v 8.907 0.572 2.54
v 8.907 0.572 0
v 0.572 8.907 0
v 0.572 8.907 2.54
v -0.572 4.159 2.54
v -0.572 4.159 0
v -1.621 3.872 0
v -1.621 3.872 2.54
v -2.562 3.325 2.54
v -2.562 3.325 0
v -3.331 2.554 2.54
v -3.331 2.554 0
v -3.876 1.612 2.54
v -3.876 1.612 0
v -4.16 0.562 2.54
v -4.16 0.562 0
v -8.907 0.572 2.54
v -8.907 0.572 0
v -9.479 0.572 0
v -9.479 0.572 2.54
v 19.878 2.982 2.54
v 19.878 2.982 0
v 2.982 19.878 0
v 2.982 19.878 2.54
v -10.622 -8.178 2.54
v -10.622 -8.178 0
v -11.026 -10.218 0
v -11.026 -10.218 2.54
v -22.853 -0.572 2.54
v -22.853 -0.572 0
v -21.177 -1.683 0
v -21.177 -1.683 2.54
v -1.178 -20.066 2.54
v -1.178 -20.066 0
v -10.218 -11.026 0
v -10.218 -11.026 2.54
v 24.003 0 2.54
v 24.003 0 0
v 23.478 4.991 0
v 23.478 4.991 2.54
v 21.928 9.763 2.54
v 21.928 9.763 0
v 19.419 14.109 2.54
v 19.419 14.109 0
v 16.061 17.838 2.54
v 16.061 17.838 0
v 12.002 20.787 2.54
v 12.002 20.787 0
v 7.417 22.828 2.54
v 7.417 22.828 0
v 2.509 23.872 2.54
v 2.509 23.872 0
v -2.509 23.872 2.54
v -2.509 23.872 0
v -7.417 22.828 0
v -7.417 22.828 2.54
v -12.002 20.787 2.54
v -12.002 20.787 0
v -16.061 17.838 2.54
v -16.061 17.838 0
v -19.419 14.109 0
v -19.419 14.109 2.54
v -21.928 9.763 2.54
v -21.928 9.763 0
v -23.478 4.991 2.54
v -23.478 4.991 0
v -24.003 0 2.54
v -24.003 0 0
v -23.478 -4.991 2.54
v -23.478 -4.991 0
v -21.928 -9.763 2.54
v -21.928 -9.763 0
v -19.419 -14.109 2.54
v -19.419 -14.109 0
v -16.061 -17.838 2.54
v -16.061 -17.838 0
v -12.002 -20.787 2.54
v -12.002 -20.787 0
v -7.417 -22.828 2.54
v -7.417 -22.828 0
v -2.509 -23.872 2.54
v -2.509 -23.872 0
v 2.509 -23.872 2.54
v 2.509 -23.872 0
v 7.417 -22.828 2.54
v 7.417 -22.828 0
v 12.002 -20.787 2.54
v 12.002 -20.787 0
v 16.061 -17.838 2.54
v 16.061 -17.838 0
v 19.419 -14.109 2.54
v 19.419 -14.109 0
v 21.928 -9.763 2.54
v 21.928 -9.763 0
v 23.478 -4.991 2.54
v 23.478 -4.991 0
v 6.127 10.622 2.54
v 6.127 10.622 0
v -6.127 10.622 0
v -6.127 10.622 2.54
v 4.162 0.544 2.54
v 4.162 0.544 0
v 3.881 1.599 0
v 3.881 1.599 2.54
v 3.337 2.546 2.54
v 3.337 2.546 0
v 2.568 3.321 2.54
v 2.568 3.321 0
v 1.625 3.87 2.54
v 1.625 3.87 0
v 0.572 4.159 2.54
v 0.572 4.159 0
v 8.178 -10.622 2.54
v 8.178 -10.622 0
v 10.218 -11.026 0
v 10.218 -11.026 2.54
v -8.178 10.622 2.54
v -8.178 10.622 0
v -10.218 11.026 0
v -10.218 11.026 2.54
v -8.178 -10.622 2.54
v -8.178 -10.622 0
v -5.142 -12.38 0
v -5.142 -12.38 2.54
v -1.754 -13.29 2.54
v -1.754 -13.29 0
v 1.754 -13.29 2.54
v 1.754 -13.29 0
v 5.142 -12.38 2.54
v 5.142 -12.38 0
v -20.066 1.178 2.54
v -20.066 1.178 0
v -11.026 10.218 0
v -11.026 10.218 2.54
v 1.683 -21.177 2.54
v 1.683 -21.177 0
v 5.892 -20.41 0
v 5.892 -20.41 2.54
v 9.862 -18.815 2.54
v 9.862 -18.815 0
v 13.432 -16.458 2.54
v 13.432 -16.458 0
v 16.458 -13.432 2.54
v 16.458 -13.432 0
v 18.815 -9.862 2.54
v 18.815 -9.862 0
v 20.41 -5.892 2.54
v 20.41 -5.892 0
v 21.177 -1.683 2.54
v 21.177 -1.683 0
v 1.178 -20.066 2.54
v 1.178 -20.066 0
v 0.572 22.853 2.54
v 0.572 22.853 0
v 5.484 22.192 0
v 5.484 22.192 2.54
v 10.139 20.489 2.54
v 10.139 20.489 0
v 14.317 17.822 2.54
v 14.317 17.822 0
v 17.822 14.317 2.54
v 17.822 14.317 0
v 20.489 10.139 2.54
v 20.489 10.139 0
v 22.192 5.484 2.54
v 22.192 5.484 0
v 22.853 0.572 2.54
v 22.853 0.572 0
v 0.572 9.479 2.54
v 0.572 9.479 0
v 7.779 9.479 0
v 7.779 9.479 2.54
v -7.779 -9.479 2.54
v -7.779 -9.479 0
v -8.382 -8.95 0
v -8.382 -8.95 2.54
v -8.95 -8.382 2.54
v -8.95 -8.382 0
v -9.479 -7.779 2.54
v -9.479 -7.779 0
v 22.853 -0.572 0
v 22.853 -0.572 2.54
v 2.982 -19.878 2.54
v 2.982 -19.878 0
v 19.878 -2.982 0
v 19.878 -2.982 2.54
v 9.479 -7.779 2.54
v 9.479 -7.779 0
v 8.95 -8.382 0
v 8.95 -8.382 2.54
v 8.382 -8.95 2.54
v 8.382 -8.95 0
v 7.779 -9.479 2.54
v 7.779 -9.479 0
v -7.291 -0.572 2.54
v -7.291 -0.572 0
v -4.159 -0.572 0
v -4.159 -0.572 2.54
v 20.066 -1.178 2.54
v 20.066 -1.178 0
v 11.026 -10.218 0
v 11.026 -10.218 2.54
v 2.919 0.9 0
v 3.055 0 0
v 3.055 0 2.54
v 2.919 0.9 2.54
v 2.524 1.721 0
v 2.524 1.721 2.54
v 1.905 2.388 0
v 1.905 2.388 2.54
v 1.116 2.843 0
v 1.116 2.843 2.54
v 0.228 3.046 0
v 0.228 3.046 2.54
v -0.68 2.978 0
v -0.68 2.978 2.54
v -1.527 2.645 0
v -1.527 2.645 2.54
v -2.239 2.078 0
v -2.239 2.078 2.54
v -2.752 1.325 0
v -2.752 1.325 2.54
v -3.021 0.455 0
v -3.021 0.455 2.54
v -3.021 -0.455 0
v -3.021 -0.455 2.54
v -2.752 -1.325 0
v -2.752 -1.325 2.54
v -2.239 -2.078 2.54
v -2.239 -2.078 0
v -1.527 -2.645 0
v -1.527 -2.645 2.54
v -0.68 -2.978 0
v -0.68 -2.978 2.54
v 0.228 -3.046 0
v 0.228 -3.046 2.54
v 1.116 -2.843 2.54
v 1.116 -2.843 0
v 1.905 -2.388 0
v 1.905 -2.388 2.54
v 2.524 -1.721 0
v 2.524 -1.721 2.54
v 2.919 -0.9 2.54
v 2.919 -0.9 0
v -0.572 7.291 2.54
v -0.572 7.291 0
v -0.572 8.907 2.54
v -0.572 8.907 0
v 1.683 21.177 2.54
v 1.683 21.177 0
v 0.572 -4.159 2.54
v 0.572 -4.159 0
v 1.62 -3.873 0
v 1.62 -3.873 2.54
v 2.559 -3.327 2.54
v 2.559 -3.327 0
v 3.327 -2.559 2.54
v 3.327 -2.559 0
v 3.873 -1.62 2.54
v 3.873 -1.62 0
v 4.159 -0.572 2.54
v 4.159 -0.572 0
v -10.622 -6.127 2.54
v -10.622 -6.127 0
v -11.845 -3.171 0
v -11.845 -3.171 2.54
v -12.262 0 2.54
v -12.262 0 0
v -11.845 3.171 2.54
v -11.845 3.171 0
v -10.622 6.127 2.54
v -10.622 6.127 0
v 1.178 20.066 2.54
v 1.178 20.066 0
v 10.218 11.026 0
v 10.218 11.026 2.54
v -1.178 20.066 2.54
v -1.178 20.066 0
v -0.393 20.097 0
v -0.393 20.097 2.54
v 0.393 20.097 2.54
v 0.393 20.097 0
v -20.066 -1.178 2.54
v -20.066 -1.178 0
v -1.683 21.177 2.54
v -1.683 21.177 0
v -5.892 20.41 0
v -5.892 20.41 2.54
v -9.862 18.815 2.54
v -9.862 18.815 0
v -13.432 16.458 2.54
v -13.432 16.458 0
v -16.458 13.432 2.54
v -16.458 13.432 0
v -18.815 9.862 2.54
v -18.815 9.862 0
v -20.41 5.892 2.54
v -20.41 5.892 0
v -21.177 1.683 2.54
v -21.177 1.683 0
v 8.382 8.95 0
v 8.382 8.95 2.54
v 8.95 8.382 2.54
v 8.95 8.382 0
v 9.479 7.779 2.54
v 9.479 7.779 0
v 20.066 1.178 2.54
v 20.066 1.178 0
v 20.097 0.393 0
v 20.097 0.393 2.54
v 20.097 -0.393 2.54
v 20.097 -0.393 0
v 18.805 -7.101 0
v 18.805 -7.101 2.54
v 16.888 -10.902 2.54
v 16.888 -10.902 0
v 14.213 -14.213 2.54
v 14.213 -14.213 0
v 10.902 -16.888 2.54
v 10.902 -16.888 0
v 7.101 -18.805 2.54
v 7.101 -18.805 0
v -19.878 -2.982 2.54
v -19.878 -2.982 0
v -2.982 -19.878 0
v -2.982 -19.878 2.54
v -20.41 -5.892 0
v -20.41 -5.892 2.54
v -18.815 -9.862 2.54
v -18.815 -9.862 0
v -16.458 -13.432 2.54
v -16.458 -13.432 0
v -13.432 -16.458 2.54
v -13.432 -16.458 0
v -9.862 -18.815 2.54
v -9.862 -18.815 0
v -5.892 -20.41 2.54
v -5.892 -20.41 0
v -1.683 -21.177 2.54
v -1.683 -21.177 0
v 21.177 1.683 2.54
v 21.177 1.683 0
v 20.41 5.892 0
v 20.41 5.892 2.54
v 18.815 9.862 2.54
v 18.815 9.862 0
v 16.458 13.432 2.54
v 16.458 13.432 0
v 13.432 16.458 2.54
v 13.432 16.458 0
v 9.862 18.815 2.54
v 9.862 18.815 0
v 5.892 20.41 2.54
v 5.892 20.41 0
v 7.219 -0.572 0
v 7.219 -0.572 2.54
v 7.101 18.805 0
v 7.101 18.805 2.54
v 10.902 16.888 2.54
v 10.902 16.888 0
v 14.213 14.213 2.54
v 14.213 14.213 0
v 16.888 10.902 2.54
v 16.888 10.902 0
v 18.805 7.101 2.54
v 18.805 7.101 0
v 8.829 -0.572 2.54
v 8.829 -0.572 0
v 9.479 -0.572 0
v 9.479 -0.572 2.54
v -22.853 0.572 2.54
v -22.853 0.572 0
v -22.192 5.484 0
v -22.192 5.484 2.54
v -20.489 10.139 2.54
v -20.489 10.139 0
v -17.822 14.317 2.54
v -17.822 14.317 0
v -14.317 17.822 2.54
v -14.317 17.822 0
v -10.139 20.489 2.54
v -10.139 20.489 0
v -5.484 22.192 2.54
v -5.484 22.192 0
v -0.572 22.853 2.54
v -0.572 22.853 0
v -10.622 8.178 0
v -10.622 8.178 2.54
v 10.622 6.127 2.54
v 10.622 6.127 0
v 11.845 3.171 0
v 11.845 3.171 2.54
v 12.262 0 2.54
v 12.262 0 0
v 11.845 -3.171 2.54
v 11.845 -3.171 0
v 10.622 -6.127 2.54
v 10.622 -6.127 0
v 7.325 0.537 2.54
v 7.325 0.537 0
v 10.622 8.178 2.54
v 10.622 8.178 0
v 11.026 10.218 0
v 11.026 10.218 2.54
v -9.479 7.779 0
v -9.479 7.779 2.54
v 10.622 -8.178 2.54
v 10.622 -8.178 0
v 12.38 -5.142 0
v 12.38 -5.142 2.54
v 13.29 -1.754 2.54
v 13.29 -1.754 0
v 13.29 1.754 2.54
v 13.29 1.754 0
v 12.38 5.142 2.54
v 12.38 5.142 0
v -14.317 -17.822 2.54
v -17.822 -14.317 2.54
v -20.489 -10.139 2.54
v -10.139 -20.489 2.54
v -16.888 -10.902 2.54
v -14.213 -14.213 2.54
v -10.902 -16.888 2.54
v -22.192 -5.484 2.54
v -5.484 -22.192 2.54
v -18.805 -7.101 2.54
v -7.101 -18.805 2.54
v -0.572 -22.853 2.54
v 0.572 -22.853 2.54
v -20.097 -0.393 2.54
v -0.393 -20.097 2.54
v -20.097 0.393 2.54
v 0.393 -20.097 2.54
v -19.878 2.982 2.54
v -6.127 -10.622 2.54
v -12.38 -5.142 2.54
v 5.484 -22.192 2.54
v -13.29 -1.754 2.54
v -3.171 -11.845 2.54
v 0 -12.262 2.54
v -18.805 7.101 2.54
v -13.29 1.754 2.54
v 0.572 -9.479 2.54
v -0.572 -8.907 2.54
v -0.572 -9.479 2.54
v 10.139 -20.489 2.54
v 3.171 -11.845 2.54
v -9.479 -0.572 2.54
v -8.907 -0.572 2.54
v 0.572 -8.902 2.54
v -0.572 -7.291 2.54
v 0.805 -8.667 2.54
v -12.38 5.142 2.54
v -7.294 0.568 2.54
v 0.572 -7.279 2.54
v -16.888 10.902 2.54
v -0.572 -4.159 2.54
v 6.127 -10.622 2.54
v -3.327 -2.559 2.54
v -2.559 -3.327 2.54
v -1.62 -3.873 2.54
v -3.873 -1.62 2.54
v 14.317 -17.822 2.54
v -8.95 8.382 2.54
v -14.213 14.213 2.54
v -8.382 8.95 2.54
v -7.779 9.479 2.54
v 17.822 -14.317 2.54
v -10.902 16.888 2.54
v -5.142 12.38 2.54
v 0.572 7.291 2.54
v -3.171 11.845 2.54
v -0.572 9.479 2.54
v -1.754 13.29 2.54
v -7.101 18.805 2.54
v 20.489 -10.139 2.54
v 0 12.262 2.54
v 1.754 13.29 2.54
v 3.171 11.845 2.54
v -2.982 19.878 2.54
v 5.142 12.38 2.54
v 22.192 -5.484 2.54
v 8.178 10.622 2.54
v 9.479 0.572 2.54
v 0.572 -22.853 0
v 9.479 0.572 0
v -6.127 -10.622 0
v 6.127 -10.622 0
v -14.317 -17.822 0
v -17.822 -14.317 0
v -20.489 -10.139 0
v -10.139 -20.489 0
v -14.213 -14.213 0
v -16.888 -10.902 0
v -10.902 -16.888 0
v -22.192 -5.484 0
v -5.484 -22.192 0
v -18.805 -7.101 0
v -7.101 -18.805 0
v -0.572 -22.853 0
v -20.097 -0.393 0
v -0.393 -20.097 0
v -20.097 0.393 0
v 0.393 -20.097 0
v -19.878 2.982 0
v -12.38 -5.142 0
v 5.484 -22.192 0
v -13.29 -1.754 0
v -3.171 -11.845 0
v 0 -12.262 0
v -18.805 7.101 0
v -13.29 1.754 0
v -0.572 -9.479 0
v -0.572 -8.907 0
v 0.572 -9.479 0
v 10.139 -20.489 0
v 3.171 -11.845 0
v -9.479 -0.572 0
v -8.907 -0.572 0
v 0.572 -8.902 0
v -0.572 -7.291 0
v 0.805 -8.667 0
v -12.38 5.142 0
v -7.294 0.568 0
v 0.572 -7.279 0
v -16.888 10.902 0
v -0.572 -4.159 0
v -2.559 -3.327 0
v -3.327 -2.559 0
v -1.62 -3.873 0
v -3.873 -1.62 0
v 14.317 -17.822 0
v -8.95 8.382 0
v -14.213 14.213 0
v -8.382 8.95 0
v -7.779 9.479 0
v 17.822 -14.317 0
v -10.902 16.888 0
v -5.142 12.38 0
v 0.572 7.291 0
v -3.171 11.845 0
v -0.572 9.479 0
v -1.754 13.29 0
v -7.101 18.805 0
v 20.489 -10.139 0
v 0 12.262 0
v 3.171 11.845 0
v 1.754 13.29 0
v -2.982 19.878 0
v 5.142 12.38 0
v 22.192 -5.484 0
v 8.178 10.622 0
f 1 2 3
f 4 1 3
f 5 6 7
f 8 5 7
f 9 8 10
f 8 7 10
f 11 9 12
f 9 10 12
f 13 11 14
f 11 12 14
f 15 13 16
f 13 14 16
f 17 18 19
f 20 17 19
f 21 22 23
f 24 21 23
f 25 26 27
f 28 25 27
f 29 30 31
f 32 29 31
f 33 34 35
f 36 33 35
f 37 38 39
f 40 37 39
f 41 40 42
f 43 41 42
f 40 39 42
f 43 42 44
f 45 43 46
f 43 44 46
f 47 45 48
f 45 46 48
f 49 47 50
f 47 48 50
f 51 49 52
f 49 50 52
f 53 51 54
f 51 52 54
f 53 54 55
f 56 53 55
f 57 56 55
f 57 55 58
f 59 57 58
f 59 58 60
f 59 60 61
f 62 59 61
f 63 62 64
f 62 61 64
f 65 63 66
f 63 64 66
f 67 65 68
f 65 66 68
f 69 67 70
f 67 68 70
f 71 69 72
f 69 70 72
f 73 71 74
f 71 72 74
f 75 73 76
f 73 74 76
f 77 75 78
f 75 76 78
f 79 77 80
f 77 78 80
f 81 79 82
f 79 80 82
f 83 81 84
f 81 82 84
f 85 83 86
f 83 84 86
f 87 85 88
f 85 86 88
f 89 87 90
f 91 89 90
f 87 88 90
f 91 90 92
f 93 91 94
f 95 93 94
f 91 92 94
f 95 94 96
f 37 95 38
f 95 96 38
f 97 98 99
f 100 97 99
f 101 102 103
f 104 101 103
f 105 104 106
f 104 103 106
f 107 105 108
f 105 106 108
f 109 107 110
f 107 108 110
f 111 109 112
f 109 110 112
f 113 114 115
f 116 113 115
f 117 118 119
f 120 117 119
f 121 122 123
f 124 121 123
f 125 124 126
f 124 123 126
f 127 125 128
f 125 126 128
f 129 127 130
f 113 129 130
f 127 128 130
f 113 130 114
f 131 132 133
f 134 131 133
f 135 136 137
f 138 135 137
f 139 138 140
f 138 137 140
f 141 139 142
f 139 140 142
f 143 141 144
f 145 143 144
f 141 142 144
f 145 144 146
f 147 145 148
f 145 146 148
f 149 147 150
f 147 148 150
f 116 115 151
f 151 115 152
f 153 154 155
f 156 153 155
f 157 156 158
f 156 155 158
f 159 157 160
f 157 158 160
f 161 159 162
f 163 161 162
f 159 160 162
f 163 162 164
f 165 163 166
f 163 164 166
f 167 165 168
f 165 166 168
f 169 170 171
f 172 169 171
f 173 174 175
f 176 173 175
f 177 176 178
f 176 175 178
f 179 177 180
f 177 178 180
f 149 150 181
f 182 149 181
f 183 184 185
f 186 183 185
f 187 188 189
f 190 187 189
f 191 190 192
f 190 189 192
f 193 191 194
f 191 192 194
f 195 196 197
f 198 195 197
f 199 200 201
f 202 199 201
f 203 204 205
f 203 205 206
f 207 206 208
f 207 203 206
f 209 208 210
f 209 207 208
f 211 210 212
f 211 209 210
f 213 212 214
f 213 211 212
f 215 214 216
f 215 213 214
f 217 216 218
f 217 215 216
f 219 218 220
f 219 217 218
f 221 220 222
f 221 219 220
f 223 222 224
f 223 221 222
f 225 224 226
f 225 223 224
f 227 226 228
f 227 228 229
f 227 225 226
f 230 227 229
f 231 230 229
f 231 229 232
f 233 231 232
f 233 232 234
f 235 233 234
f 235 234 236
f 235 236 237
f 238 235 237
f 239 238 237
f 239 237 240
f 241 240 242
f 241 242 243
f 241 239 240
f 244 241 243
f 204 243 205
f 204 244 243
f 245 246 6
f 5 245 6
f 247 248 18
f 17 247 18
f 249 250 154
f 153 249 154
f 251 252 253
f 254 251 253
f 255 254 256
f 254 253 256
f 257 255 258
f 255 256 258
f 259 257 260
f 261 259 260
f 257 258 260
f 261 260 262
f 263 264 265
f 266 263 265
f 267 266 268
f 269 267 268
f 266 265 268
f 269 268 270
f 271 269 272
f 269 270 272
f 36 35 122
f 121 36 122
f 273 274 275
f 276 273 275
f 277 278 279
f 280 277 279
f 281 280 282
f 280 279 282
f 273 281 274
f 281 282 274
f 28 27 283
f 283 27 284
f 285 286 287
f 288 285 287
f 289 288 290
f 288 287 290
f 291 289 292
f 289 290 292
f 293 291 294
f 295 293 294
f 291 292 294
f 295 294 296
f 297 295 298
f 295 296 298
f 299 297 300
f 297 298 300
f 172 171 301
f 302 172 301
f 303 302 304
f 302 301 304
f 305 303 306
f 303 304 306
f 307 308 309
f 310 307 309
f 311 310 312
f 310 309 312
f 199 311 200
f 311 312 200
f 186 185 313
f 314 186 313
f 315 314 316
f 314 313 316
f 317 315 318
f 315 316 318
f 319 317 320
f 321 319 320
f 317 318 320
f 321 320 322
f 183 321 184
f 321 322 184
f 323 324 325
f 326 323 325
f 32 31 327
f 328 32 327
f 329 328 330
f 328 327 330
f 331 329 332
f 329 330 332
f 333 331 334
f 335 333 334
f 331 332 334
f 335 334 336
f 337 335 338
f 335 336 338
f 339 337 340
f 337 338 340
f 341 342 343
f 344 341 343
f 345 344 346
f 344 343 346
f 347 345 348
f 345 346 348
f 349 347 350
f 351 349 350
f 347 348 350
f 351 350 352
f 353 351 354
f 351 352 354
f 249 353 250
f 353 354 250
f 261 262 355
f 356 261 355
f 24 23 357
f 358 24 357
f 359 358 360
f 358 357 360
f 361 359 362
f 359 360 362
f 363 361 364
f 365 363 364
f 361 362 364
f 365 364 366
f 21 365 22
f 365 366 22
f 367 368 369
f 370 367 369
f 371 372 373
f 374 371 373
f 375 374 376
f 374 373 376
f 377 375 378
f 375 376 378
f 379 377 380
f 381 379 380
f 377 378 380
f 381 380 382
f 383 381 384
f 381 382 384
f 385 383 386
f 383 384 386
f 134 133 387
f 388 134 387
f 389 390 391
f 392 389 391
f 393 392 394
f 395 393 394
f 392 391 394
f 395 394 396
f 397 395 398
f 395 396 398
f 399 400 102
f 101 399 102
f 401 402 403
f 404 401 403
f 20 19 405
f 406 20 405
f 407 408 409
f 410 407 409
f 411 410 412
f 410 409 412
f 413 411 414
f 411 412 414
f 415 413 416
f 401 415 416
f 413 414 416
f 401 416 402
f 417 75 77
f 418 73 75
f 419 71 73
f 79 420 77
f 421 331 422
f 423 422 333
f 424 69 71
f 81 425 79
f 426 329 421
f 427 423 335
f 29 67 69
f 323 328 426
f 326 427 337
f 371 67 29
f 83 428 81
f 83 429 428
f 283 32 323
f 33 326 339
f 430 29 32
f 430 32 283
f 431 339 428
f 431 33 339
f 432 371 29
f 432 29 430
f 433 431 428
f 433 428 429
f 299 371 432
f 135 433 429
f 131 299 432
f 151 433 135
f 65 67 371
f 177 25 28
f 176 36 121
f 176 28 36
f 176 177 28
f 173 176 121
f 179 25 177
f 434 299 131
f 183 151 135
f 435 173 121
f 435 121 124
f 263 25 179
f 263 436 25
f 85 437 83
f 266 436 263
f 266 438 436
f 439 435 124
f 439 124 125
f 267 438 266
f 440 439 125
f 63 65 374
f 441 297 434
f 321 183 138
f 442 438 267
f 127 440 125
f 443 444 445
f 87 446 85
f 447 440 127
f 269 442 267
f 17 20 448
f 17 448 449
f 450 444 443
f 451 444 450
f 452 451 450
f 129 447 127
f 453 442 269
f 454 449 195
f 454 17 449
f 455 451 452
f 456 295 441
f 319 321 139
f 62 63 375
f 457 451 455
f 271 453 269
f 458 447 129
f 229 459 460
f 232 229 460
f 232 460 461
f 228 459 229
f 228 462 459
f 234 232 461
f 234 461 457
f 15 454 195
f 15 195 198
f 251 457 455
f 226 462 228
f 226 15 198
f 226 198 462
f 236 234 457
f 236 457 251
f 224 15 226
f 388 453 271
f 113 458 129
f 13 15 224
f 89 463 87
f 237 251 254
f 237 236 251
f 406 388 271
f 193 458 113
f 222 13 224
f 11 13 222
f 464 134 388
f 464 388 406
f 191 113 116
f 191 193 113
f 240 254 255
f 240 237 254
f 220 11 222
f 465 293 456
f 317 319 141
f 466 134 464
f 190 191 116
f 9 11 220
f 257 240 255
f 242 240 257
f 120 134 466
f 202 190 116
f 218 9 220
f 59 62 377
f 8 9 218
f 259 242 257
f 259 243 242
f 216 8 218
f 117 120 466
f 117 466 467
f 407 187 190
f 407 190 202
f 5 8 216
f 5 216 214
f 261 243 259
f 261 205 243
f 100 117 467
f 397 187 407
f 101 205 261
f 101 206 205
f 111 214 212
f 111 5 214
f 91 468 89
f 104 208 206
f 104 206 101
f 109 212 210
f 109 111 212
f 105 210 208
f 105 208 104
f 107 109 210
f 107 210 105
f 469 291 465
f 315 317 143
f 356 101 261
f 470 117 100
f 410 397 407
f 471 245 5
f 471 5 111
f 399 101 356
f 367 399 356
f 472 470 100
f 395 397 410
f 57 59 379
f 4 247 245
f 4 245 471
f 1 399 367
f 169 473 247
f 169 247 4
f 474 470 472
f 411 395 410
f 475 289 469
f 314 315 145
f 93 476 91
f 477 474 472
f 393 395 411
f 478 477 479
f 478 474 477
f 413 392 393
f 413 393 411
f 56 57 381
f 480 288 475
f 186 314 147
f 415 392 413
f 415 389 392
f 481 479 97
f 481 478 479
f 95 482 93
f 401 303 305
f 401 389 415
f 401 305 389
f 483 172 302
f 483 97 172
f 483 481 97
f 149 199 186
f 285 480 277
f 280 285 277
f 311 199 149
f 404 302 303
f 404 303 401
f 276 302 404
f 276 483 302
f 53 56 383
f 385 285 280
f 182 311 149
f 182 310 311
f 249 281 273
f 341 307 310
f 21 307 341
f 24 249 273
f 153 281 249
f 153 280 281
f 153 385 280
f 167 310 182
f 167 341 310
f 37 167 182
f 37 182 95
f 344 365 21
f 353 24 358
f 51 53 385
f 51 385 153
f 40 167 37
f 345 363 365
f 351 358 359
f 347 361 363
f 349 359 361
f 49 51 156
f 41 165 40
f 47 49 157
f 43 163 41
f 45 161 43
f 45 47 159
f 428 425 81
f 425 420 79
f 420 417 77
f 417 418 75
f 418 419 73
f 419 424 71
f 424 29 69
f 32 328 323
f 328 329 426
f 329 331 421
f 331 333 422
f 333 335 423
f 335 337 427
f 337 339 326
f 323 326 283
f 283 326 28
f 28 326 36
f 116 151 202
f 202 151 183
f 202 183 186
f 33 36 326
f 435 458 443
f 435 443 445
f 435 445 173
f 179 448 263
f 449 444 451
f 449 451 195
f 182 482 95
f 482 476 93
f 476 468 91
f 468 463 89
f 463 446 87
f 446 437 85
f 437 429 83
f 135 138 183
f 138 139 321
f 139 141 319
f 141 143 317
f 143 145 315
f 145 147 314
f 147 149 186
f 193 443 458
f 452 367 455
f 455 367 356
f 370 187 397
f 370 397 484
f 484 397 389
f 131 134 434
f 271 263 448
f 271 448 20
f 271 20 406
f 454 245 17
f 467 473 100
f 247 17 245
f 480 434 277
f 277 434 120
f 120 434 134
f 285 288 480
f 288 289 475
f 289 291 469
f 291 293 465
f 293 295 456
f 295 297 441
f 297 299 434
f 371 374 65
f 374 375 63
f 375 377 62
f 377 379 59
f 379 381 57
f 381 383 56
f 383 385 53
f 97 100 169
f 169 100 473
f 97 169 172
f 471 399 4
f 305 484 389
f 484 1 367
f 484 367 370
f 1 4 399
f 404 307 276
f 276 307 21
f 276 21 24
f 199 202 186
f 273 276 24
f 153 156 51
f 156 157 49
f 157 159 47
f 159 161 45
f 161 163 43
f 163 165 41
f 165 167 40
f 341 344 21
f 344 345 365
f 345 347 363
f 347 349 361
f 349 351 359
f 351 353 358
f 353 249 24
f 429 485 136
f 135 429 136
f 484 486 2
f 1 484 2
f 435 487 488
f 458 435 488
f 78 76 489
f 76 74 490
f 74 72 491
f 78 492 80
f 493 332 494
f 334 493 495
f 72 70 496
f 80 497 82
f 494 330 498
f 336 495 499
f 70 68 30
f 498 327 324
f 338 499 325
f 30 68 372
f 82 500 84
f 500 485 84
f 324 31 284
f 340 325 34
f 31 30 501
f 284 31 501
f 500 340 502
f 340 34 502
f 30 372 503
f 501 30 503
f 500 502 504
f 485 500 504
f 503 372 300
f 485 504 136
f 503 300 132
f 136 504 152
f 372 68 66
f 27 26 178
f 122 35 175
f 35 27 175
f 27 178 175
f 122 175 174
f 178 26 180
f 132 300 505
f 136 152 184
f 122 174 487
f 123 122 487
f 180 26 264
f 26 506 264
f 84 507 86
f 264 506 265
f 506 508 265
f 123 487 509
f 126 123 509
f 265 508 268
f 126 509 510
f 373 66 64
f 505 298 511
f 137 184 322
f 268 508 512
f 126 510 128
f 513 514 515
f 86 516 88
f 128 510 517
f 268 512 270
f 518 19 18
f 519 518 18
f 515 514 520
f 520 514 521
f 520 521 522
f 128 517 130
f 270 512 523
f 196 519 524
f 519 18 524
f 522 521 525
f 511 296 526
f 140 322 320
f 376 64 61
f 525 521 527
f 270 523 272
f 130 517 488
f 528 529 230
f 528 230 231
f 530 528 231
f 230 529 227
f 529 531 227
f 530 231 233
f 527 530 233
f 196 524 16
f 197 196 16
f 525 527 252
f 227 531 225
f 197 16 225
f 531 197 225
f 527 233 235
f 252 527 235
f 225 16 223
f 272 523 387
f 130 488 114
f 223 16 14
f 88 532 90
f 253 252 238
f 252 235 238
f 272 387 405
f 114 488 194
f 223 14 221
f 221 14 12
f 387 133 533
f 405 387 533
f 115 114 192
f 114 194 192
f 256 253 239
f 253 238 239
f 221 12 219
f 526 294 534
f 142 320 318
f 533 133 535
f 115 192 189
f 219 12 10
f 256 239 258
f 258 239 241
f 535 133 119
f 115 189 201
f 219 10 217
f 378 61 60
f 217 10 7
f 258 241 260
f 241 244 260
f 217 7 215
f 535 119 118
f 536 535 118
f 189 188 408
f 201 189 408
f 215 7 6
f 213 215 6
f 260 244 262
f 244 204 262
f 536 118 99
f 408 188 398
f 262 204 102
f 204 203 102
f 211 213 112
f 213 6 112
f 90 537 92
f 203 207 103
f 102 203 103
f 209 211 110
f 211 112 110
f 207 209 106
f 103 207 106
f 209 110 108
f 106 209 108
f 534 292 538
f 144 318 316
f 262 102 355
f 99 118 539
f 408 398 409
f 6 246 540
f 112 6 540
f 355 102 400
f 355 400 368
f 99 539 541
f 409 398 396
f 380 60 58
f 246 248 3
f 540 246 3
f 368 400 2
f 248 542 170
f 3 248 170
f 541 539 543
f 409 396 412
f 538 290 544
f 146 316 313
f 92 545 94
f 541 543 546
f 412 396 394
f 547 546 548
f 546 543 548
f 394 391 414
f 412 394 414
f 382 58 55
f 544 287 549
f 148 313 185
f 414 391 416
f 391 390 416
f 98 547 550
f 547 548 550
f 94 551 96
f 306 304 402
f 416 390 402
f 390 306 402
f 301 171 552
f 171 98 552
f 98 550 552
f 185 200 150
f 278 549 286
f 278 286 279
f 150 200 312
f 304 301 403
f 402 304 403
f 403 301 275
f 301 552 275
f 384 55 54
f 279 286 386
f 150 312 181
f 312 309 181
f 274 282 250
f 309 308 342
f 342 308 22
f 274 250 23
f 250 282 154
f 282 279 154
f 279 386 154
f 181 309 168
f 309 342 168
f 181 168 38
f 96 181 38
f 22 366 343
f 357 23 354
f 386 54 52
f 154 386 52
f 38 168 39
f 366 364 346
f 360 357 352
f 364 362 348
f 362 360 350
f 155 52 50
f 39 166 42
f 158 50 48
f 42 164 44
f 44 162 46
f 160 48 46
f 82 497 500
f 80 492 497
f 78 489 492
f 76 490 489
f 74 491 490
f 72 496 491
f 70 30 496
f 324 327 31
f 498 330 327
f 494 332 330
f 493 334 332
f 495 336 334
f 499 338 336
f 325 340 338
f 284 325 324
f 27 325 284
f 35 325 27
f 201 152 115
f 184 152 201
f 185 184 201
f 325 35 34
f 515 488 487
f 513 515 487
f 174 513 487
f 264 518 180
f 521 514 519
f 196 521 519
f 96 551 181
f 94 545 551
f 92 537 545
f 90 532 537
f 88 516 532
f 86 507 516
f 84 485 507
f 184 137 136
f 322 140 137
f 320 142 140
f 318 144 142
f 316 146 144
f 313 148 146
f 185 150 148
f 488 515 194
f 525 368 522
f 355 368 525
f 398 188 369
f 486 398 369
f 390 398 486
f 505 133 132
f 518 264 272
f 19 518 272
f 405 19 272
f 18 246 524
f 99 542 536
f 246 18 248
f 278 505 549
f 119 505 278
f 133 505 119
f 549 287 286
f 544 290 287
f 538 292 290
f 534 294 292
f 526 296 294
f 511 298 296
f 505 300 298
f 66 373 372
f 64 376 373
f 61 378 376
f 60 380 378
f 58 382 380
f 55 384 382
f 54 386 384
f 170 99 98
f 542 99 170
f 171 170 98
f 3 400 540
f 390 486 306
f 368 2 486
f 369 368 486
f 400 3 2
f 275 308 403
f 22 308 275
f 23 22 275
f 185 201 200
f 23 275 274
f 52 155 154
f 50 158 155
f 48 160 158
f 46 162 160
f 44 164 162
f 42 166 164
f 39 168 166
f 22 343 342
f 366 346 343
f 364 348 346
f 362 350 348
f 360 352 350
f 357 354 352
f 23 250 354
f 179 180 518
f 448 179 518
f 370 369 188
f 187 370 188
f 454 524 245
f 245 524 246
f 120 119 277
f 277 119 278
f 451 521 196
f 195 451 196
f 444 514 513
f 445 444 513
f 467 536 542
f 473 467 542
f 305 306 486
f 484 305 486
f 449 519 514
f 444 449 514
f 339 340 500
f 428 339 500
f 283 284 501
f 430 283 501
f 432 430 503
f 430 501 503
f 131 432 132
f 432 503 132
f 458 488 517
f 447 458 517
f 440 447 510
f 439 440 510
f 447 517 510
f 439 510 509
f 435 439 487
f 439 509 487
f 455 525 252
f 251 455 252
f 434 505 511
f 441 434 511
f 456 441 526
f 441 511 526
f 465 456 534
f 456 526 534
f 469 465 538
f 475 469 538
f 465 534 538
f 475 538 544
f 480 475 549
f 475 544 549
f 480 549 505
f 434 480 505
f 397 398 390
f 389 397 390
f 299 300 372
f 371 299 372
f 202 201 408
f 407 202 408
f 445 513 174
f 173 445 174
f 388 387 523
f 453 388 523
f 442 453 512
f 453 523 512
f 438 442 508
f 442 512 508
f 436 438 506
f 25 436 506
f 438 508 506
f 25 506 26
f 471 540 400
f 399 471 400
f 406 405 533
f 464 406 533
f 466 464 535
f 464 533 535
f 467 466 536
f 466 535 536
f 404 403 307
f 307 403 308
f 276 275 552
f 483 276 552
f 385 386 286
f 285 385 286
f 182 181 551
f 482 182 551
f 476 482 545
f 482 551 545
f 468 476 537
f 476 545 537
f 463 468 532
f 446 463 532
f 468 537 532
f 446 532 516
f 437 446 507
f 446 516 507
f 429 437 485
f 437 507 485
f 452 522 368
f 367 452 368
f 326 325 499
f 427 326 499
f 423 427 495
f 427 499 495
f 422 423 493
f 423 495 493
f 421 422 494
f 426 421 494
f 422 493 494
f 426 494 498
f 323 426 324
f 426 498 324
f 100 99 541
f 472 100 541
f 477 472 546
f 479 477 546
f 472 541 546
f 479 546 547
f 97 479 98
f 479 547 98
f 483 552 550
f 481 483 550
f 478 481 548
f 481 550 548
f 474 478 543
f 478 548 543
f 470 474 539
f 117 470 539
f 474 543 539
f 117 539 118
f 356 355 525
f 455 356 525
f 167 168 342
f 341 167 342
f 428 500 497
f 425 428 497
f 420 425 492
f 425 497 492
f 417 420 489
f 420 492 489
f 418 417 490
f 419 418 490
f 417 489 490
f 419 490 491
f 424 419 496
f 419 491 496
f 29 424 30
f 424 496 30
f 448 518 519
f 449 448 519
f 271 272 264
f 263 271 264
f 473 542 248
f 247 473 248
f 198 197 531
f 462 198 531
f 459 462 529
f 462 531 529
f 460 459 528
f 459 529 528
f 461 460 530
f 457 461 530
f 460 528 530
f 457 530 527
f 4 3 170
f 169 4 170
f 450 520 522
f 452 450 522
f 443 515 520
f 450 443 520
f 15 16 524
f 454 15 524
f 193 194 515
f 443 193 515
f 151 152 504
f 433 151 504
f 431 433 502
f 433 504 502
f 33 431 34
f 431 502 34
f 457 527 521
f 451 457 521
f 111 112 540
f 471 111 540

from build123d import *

# Parameters (mm, degrees)
F0_R     = 24.003
F0_R_2   = 3.054646
F1_DEPTH = 2.54


with BuildPart() as f1:
    # F0 (on Top) → F1 (new body)
    with BuildSketch(Plane.XY):
        Circle(F0_R)
        with BuildLine():
            ThreePointArc((1.17752, -20.066034), (0, -20.100554), (-1.17752, -20.066034))
            Line((-1.17752, -20.066034), (-10.217665, -11.025888))
            Line((-10.217665, -11.025888), (-8.177547, -10.621777))
            ThreePointArc((-8.177547, -10.621777), (0, -13.405015), (8.177547, -10.621777))
            Line((8.177547, -10.621777), (10.217665, -11.025888))
            Line((10.217665, -11.025888), (1.17752, -20.066034))
        make_face(mode=Mode.SUBTRACT)
        with BuildLine():
            ThreePointArc((-0.5715, -22.852855), (-16.164461, -16.164461), (-22.852855, -0.5715))
            Line((-22.852855, -0.5715), (-21.176763, -1.683237))
            ThreePointArc((-21.176763, -1.683237), (-15.021461, -15.021461), (-1.683237, -21.176763))
            Line((-1.683237, -21.176763), (-0.5715, -22.852855))
        make_face(mode=Mode.SUBTRACT)
        with BuildLine():
            Line((-19.87815, -2.98185), (-2.98185, -19.87815))
            ThreePointArc((-2.98185, -19.87815), (-14.213238, -14.213238), (-19.87815, -2.98185))
        make_face(mode=Mode.SUBTRACT)
        with BuildLine():
            ThreePointArc((-10.621777, -6.12657), (-12.262015, 0), (-10.621777, 6.12657))
            Line((-10.621777, 6.12657), (-10.621777, -6.12657))
        make_face(mode=Mode.SUBTRACT)
        with BuildLine():
            Line((-0.5715, -9.478777), (-7.778804, -9.478777))
            ThreePointArc((-7.778804, -9.478777), (-8.670554, -8.670554), (-9.478777, -7.778804))
            Line((-9.478777, -7.778804), (-9.478777, -0.5715))
            Line((-9.478777, -0.5715), (-8.907277, -0.5715))
            Line((-8.907277, -0.5715), (-7.645644, -1.833133))
            Line((-7.645644, -1.833133), (-1.833133, -7.645644))
            Line((-1.833133, -7.645644), (-0.808231, -8.670546))
            Line((-0.808231, -8.670546), (-0.5715, -8.907277))
            Line((-0.5715, -8.907277), (-0.5715, -9.478777))
        make_face(mode=Mode.SUBTRACT)
        with BuildLine():
            Line((-0.5715, -7.290831), (-7.290831, -0.5715))
            Line((-7.290831, -0.5715), (-4.15856, -0.5715))
            ThreePointArc((-4.15856, -0.5715), (-2.968184, -2.968184), (-0.5715, -4.15856))
            Line((-0.5715, -4.15856), (-0.5715, -7.290831))
        make_face(mode=Mode.SUBTRACT)
        with BuildLine():
            ThreePointArc((6.12657, -10.621777), (0, -12.262015), (-6.12657, -10.621777))
            Line((-6.12657, -10.621777), (6.12657, -10.621777))
        make_face(mode=Mode.SUBTRACT)
        with BuildLine():
            ThreePointArc((22.852855, -0.5715), (16.164461, -16.164461), (0.5715, -22.852855))
            Line((0.5715, -22.852855), (1.683237, -21.176763))
            ThreePointArc((1.683237, -21.176763), (15.021461, -15.021461), (21.176763, -1.683237))
            Line((21.176763, -1.683237), (22.852855, -0.5715))
        make_face(mode=Mode.SUBTRACT)
        with BuildLine():
            ThreePointArc((19.87815, -2.98185), (14.213238, -14.213238), (2.98185, -19.87815))
            Line((2.98185, -19.87815), (19.87815, -2.98185))
        make_face(mode=Mode.SUBTRACT)
        with BuildLine():
            Line((0.5715, -9.478777), (0.5715, -8.902199))
            Line((0.5715, -8.902199), (0.804649, -8.666979))
            Line((0.804649, -8.666979), (8.828836, -0.5715))
            Line((8.828836, -0.5715), (9.478777, -0.5715))
            Line((9.478777, -0.5715), (9.478777, -7.778804))
            ThreePointArc((9.478777, -7.778804), (8.670554, -8.670554), (7.778804, -9.478777))
            Line((7.778804, -9.478777), (0.5715, -9.478777))
        make_face(mode=Mode.SUBTRACT)
        with BuildLine():
            Line((7.219491, -0.5715), (0.5715, -7.278557))
            Line((0.5715, -7.278557), (0.5715, -4.15856))
            ThreePointArc((0.5715, -4.15856), (2.968184, -2.968184), (4.15856, -0.5715))
            Line((4.15856, -0.5715), (7.219491, -0.5715))
        make_face(mode=Mode.SUBTRACT)
        with BuildLine():
            ThreePointArc((20.066034, 1.17752), (20.100554, 0), (20.066034, -1.17752))
            Line((20.066034, -1.17752), (11.025888, -10.217665))
            Line((11.025888, -10.217665), (10.621777, -8.177547))
            ThreePointArc((10.621777, -8.177547), (13.405015, 0), (10.621777, 8.177547))
            Line((10.621777, 8.177547), (11.025888, 10.217665))
            Line((11.025888, 10.217665), (20.066034, 1.17752))
        make_face(mode=Mode.SUBTRACT)
        with BuildLine():
            ThreePointArc((-20.066034, -1.17752), (-20.100554, 0), (-20.066034, 1.17752))
            Line((-20.066034, 1.17752), (-11.025888, 10.217665))
            Line((-11.025888, 10.217665), (-10.621777, 8.177547))
            ThreePointArc((-10.621777, 8.177547), (-13.405015, 0), (-10.621777, -8.177547))
            Line((-10.621777, -8.177547), (-11.025888, -10.217665))
            Line((-11.025888, -10.217665), (-20.066034, -1.17752))
        make_face(mode=Mode.SUBTRACT)
        with BuildLine():
            Line((-7.294226, 0.568104), (-0.5715, 7.290831))
            Line((-0.5715, 7.290831), (-0.5715, 4.15856))
            ThreePointArc((-0.5715, 4.15856), (-2.971748, 2.964616), (-4.159921, 0.561506))
            Line((-4.159921, 0.561506), (-7.294226, 0.568104))
        make_face(mode=Mode.SUBTRACT)
        with BuildLine():
            ThreePointArc((-9.478777, 7.778804), (-8.670554, 8.670554), (-7.778804, 9.478777))
            Line((-7.778804, 9.478777), (-0.5715, 9.478777))
            Line((-0.5715, 9.478777), (-0.5715, 8.907277))
            Line((-0.5715, 8.907277), (-1.833133, 7.645644))
            Line((-1.833133, 7.645644), (-7.645644, 1.833133))
            Line((-7.645644, 1.833133), (-8.907277, 0.5715))
            Line((-8.907277, 0.5715), (-9.478777, 0.5715))
            Line((-9.478777, 0.5715), (-9.478777, 7.778804))
        make_face(mode=Mode.SUBTRACT)
        with BuildLine():
            Line((-2.98185, 19.87815), (-19.87815, 2.98185))
            ThreePointArc((-19.87815, 2.98185), (-14.213238, 14.213238), (-2.98185, 19.87815))
        make_face(mode=Mode.SUBTRACT)
        with BuildLine():
            ThreePointArc((-1.683237, 21.176763), (-15.021461, 15.021461), (-21.176763, 1.683237))
            Line((-21.176763, 1.683237), (-22.852855, 0.5715))
            ThreePointArc((-22.852855, 0.5715), (-16.164461, 16.164461), (-0.5715, 22.852855))
            Line((-0.5715, 22.852855), (-1.683237, 21.176763))
        make_face(mode=Mode.SUBTRACT)
        with BuildLine():
            Line((6.12657, 10.621777), (-6.12657, 10.621777))
            ThreePointArc((-6.12657, 10.621777), (0, 12.262015), (6.12657, 10.621777))
        make_face(mode=Mode.SUBTRACT)
        with BuildLine():
            ThreePointArc((-1.17752, 20.066034), (0, 20.100554), (1.17752, 20.066034))
            Line((1.17752, 20.066034), (10.217665, 11.025888))
            Line((10.217665, 11.025888), (8.177547, 10.621777))
            ThreePointArc((8.177547, 10.621777), (0, 13.405015), (-8.177547, 10.621777))
            Line((-8.177547, 10.621777), (-10.217665, 11.025888))
            Line((-10.217665, 11.025888), (-1.17752, 20.066034))
        make_face(mode=Mode.SUBTRACT)
        Circle(F0_R_2, mode=Mode.SUBTRACT)
        with BuildLine():
            Line((0.5715, 7.290831), (7.325001, 0.53733))
            Line((7.325001, 0.53733), (4.162248, 0.543987))
            ThreePointArc((4.162248, 0.543987), (2.977982, 2.958354), (0.5715, 4.15856))
            Line((0.5715, 4.15856), (0.5715, 7.290831))
        make_face(mode=Mode.SUBTRACT)
        with BuildLine():
            ThreePointArc((7.778804, 9.478777), (8.670554, 8.670554), (9.478777, 7.778804))
            Line((9.478777, 7.778804), (9.478777, 0.5715))
            Line((9.478777, 0.5715), (8.907277, 0.5715))
            Line((8.907277, 0.5715), (7.645644, 1.833133))
            Line((7.645644, 1.833133), (1.833133, 7.645644))
            Line((1.833133, 7.645644), (0.5715, 8.907277))
            Line((0.5715, 8.907277), (0.5715, 9.478777))
            Line((0.5715, 9.478777), (7.778804, 9.478777))
        make_face(mode=Mode.SUBTRACT)
        with BuildLine():
            ThreePointArc((10.621777, 6.12657), (12.262015, 0), (10.621777, -6.12657))
            Line((10.621777, -6.12657), (10.621777, 6.12657))
        make_face(mode=Mode.SUBTRACT)
        with BuildLine():
            Line((19.87815, 2.98185), (2.98185, 19.87815))
            ThreePointArc((2.98185, 19.87815), (14.213238, 14.213238), (19.87815, 2.98185))
        make_face(mode=Mode.SUBTRACT)
        with BuildLine():
            ThreePointArc((0.5715, 22.852855), (16.164461, 16.164461), (22.852855, 0.5715))
            Line((22.852855, 0.5715), (21.176763, 1.683237))
            ThreePointArc((21.176763, 1.683237), (15.021461, 15.021461), (1.683237, 21.176763))
            Line((1.683237, 21.176763), (0.5715, 22.852855))
        make_face(mode=Mode.SUBTRACT)
    extrude(amount=F1_DEPTH)


solid = f1.part
